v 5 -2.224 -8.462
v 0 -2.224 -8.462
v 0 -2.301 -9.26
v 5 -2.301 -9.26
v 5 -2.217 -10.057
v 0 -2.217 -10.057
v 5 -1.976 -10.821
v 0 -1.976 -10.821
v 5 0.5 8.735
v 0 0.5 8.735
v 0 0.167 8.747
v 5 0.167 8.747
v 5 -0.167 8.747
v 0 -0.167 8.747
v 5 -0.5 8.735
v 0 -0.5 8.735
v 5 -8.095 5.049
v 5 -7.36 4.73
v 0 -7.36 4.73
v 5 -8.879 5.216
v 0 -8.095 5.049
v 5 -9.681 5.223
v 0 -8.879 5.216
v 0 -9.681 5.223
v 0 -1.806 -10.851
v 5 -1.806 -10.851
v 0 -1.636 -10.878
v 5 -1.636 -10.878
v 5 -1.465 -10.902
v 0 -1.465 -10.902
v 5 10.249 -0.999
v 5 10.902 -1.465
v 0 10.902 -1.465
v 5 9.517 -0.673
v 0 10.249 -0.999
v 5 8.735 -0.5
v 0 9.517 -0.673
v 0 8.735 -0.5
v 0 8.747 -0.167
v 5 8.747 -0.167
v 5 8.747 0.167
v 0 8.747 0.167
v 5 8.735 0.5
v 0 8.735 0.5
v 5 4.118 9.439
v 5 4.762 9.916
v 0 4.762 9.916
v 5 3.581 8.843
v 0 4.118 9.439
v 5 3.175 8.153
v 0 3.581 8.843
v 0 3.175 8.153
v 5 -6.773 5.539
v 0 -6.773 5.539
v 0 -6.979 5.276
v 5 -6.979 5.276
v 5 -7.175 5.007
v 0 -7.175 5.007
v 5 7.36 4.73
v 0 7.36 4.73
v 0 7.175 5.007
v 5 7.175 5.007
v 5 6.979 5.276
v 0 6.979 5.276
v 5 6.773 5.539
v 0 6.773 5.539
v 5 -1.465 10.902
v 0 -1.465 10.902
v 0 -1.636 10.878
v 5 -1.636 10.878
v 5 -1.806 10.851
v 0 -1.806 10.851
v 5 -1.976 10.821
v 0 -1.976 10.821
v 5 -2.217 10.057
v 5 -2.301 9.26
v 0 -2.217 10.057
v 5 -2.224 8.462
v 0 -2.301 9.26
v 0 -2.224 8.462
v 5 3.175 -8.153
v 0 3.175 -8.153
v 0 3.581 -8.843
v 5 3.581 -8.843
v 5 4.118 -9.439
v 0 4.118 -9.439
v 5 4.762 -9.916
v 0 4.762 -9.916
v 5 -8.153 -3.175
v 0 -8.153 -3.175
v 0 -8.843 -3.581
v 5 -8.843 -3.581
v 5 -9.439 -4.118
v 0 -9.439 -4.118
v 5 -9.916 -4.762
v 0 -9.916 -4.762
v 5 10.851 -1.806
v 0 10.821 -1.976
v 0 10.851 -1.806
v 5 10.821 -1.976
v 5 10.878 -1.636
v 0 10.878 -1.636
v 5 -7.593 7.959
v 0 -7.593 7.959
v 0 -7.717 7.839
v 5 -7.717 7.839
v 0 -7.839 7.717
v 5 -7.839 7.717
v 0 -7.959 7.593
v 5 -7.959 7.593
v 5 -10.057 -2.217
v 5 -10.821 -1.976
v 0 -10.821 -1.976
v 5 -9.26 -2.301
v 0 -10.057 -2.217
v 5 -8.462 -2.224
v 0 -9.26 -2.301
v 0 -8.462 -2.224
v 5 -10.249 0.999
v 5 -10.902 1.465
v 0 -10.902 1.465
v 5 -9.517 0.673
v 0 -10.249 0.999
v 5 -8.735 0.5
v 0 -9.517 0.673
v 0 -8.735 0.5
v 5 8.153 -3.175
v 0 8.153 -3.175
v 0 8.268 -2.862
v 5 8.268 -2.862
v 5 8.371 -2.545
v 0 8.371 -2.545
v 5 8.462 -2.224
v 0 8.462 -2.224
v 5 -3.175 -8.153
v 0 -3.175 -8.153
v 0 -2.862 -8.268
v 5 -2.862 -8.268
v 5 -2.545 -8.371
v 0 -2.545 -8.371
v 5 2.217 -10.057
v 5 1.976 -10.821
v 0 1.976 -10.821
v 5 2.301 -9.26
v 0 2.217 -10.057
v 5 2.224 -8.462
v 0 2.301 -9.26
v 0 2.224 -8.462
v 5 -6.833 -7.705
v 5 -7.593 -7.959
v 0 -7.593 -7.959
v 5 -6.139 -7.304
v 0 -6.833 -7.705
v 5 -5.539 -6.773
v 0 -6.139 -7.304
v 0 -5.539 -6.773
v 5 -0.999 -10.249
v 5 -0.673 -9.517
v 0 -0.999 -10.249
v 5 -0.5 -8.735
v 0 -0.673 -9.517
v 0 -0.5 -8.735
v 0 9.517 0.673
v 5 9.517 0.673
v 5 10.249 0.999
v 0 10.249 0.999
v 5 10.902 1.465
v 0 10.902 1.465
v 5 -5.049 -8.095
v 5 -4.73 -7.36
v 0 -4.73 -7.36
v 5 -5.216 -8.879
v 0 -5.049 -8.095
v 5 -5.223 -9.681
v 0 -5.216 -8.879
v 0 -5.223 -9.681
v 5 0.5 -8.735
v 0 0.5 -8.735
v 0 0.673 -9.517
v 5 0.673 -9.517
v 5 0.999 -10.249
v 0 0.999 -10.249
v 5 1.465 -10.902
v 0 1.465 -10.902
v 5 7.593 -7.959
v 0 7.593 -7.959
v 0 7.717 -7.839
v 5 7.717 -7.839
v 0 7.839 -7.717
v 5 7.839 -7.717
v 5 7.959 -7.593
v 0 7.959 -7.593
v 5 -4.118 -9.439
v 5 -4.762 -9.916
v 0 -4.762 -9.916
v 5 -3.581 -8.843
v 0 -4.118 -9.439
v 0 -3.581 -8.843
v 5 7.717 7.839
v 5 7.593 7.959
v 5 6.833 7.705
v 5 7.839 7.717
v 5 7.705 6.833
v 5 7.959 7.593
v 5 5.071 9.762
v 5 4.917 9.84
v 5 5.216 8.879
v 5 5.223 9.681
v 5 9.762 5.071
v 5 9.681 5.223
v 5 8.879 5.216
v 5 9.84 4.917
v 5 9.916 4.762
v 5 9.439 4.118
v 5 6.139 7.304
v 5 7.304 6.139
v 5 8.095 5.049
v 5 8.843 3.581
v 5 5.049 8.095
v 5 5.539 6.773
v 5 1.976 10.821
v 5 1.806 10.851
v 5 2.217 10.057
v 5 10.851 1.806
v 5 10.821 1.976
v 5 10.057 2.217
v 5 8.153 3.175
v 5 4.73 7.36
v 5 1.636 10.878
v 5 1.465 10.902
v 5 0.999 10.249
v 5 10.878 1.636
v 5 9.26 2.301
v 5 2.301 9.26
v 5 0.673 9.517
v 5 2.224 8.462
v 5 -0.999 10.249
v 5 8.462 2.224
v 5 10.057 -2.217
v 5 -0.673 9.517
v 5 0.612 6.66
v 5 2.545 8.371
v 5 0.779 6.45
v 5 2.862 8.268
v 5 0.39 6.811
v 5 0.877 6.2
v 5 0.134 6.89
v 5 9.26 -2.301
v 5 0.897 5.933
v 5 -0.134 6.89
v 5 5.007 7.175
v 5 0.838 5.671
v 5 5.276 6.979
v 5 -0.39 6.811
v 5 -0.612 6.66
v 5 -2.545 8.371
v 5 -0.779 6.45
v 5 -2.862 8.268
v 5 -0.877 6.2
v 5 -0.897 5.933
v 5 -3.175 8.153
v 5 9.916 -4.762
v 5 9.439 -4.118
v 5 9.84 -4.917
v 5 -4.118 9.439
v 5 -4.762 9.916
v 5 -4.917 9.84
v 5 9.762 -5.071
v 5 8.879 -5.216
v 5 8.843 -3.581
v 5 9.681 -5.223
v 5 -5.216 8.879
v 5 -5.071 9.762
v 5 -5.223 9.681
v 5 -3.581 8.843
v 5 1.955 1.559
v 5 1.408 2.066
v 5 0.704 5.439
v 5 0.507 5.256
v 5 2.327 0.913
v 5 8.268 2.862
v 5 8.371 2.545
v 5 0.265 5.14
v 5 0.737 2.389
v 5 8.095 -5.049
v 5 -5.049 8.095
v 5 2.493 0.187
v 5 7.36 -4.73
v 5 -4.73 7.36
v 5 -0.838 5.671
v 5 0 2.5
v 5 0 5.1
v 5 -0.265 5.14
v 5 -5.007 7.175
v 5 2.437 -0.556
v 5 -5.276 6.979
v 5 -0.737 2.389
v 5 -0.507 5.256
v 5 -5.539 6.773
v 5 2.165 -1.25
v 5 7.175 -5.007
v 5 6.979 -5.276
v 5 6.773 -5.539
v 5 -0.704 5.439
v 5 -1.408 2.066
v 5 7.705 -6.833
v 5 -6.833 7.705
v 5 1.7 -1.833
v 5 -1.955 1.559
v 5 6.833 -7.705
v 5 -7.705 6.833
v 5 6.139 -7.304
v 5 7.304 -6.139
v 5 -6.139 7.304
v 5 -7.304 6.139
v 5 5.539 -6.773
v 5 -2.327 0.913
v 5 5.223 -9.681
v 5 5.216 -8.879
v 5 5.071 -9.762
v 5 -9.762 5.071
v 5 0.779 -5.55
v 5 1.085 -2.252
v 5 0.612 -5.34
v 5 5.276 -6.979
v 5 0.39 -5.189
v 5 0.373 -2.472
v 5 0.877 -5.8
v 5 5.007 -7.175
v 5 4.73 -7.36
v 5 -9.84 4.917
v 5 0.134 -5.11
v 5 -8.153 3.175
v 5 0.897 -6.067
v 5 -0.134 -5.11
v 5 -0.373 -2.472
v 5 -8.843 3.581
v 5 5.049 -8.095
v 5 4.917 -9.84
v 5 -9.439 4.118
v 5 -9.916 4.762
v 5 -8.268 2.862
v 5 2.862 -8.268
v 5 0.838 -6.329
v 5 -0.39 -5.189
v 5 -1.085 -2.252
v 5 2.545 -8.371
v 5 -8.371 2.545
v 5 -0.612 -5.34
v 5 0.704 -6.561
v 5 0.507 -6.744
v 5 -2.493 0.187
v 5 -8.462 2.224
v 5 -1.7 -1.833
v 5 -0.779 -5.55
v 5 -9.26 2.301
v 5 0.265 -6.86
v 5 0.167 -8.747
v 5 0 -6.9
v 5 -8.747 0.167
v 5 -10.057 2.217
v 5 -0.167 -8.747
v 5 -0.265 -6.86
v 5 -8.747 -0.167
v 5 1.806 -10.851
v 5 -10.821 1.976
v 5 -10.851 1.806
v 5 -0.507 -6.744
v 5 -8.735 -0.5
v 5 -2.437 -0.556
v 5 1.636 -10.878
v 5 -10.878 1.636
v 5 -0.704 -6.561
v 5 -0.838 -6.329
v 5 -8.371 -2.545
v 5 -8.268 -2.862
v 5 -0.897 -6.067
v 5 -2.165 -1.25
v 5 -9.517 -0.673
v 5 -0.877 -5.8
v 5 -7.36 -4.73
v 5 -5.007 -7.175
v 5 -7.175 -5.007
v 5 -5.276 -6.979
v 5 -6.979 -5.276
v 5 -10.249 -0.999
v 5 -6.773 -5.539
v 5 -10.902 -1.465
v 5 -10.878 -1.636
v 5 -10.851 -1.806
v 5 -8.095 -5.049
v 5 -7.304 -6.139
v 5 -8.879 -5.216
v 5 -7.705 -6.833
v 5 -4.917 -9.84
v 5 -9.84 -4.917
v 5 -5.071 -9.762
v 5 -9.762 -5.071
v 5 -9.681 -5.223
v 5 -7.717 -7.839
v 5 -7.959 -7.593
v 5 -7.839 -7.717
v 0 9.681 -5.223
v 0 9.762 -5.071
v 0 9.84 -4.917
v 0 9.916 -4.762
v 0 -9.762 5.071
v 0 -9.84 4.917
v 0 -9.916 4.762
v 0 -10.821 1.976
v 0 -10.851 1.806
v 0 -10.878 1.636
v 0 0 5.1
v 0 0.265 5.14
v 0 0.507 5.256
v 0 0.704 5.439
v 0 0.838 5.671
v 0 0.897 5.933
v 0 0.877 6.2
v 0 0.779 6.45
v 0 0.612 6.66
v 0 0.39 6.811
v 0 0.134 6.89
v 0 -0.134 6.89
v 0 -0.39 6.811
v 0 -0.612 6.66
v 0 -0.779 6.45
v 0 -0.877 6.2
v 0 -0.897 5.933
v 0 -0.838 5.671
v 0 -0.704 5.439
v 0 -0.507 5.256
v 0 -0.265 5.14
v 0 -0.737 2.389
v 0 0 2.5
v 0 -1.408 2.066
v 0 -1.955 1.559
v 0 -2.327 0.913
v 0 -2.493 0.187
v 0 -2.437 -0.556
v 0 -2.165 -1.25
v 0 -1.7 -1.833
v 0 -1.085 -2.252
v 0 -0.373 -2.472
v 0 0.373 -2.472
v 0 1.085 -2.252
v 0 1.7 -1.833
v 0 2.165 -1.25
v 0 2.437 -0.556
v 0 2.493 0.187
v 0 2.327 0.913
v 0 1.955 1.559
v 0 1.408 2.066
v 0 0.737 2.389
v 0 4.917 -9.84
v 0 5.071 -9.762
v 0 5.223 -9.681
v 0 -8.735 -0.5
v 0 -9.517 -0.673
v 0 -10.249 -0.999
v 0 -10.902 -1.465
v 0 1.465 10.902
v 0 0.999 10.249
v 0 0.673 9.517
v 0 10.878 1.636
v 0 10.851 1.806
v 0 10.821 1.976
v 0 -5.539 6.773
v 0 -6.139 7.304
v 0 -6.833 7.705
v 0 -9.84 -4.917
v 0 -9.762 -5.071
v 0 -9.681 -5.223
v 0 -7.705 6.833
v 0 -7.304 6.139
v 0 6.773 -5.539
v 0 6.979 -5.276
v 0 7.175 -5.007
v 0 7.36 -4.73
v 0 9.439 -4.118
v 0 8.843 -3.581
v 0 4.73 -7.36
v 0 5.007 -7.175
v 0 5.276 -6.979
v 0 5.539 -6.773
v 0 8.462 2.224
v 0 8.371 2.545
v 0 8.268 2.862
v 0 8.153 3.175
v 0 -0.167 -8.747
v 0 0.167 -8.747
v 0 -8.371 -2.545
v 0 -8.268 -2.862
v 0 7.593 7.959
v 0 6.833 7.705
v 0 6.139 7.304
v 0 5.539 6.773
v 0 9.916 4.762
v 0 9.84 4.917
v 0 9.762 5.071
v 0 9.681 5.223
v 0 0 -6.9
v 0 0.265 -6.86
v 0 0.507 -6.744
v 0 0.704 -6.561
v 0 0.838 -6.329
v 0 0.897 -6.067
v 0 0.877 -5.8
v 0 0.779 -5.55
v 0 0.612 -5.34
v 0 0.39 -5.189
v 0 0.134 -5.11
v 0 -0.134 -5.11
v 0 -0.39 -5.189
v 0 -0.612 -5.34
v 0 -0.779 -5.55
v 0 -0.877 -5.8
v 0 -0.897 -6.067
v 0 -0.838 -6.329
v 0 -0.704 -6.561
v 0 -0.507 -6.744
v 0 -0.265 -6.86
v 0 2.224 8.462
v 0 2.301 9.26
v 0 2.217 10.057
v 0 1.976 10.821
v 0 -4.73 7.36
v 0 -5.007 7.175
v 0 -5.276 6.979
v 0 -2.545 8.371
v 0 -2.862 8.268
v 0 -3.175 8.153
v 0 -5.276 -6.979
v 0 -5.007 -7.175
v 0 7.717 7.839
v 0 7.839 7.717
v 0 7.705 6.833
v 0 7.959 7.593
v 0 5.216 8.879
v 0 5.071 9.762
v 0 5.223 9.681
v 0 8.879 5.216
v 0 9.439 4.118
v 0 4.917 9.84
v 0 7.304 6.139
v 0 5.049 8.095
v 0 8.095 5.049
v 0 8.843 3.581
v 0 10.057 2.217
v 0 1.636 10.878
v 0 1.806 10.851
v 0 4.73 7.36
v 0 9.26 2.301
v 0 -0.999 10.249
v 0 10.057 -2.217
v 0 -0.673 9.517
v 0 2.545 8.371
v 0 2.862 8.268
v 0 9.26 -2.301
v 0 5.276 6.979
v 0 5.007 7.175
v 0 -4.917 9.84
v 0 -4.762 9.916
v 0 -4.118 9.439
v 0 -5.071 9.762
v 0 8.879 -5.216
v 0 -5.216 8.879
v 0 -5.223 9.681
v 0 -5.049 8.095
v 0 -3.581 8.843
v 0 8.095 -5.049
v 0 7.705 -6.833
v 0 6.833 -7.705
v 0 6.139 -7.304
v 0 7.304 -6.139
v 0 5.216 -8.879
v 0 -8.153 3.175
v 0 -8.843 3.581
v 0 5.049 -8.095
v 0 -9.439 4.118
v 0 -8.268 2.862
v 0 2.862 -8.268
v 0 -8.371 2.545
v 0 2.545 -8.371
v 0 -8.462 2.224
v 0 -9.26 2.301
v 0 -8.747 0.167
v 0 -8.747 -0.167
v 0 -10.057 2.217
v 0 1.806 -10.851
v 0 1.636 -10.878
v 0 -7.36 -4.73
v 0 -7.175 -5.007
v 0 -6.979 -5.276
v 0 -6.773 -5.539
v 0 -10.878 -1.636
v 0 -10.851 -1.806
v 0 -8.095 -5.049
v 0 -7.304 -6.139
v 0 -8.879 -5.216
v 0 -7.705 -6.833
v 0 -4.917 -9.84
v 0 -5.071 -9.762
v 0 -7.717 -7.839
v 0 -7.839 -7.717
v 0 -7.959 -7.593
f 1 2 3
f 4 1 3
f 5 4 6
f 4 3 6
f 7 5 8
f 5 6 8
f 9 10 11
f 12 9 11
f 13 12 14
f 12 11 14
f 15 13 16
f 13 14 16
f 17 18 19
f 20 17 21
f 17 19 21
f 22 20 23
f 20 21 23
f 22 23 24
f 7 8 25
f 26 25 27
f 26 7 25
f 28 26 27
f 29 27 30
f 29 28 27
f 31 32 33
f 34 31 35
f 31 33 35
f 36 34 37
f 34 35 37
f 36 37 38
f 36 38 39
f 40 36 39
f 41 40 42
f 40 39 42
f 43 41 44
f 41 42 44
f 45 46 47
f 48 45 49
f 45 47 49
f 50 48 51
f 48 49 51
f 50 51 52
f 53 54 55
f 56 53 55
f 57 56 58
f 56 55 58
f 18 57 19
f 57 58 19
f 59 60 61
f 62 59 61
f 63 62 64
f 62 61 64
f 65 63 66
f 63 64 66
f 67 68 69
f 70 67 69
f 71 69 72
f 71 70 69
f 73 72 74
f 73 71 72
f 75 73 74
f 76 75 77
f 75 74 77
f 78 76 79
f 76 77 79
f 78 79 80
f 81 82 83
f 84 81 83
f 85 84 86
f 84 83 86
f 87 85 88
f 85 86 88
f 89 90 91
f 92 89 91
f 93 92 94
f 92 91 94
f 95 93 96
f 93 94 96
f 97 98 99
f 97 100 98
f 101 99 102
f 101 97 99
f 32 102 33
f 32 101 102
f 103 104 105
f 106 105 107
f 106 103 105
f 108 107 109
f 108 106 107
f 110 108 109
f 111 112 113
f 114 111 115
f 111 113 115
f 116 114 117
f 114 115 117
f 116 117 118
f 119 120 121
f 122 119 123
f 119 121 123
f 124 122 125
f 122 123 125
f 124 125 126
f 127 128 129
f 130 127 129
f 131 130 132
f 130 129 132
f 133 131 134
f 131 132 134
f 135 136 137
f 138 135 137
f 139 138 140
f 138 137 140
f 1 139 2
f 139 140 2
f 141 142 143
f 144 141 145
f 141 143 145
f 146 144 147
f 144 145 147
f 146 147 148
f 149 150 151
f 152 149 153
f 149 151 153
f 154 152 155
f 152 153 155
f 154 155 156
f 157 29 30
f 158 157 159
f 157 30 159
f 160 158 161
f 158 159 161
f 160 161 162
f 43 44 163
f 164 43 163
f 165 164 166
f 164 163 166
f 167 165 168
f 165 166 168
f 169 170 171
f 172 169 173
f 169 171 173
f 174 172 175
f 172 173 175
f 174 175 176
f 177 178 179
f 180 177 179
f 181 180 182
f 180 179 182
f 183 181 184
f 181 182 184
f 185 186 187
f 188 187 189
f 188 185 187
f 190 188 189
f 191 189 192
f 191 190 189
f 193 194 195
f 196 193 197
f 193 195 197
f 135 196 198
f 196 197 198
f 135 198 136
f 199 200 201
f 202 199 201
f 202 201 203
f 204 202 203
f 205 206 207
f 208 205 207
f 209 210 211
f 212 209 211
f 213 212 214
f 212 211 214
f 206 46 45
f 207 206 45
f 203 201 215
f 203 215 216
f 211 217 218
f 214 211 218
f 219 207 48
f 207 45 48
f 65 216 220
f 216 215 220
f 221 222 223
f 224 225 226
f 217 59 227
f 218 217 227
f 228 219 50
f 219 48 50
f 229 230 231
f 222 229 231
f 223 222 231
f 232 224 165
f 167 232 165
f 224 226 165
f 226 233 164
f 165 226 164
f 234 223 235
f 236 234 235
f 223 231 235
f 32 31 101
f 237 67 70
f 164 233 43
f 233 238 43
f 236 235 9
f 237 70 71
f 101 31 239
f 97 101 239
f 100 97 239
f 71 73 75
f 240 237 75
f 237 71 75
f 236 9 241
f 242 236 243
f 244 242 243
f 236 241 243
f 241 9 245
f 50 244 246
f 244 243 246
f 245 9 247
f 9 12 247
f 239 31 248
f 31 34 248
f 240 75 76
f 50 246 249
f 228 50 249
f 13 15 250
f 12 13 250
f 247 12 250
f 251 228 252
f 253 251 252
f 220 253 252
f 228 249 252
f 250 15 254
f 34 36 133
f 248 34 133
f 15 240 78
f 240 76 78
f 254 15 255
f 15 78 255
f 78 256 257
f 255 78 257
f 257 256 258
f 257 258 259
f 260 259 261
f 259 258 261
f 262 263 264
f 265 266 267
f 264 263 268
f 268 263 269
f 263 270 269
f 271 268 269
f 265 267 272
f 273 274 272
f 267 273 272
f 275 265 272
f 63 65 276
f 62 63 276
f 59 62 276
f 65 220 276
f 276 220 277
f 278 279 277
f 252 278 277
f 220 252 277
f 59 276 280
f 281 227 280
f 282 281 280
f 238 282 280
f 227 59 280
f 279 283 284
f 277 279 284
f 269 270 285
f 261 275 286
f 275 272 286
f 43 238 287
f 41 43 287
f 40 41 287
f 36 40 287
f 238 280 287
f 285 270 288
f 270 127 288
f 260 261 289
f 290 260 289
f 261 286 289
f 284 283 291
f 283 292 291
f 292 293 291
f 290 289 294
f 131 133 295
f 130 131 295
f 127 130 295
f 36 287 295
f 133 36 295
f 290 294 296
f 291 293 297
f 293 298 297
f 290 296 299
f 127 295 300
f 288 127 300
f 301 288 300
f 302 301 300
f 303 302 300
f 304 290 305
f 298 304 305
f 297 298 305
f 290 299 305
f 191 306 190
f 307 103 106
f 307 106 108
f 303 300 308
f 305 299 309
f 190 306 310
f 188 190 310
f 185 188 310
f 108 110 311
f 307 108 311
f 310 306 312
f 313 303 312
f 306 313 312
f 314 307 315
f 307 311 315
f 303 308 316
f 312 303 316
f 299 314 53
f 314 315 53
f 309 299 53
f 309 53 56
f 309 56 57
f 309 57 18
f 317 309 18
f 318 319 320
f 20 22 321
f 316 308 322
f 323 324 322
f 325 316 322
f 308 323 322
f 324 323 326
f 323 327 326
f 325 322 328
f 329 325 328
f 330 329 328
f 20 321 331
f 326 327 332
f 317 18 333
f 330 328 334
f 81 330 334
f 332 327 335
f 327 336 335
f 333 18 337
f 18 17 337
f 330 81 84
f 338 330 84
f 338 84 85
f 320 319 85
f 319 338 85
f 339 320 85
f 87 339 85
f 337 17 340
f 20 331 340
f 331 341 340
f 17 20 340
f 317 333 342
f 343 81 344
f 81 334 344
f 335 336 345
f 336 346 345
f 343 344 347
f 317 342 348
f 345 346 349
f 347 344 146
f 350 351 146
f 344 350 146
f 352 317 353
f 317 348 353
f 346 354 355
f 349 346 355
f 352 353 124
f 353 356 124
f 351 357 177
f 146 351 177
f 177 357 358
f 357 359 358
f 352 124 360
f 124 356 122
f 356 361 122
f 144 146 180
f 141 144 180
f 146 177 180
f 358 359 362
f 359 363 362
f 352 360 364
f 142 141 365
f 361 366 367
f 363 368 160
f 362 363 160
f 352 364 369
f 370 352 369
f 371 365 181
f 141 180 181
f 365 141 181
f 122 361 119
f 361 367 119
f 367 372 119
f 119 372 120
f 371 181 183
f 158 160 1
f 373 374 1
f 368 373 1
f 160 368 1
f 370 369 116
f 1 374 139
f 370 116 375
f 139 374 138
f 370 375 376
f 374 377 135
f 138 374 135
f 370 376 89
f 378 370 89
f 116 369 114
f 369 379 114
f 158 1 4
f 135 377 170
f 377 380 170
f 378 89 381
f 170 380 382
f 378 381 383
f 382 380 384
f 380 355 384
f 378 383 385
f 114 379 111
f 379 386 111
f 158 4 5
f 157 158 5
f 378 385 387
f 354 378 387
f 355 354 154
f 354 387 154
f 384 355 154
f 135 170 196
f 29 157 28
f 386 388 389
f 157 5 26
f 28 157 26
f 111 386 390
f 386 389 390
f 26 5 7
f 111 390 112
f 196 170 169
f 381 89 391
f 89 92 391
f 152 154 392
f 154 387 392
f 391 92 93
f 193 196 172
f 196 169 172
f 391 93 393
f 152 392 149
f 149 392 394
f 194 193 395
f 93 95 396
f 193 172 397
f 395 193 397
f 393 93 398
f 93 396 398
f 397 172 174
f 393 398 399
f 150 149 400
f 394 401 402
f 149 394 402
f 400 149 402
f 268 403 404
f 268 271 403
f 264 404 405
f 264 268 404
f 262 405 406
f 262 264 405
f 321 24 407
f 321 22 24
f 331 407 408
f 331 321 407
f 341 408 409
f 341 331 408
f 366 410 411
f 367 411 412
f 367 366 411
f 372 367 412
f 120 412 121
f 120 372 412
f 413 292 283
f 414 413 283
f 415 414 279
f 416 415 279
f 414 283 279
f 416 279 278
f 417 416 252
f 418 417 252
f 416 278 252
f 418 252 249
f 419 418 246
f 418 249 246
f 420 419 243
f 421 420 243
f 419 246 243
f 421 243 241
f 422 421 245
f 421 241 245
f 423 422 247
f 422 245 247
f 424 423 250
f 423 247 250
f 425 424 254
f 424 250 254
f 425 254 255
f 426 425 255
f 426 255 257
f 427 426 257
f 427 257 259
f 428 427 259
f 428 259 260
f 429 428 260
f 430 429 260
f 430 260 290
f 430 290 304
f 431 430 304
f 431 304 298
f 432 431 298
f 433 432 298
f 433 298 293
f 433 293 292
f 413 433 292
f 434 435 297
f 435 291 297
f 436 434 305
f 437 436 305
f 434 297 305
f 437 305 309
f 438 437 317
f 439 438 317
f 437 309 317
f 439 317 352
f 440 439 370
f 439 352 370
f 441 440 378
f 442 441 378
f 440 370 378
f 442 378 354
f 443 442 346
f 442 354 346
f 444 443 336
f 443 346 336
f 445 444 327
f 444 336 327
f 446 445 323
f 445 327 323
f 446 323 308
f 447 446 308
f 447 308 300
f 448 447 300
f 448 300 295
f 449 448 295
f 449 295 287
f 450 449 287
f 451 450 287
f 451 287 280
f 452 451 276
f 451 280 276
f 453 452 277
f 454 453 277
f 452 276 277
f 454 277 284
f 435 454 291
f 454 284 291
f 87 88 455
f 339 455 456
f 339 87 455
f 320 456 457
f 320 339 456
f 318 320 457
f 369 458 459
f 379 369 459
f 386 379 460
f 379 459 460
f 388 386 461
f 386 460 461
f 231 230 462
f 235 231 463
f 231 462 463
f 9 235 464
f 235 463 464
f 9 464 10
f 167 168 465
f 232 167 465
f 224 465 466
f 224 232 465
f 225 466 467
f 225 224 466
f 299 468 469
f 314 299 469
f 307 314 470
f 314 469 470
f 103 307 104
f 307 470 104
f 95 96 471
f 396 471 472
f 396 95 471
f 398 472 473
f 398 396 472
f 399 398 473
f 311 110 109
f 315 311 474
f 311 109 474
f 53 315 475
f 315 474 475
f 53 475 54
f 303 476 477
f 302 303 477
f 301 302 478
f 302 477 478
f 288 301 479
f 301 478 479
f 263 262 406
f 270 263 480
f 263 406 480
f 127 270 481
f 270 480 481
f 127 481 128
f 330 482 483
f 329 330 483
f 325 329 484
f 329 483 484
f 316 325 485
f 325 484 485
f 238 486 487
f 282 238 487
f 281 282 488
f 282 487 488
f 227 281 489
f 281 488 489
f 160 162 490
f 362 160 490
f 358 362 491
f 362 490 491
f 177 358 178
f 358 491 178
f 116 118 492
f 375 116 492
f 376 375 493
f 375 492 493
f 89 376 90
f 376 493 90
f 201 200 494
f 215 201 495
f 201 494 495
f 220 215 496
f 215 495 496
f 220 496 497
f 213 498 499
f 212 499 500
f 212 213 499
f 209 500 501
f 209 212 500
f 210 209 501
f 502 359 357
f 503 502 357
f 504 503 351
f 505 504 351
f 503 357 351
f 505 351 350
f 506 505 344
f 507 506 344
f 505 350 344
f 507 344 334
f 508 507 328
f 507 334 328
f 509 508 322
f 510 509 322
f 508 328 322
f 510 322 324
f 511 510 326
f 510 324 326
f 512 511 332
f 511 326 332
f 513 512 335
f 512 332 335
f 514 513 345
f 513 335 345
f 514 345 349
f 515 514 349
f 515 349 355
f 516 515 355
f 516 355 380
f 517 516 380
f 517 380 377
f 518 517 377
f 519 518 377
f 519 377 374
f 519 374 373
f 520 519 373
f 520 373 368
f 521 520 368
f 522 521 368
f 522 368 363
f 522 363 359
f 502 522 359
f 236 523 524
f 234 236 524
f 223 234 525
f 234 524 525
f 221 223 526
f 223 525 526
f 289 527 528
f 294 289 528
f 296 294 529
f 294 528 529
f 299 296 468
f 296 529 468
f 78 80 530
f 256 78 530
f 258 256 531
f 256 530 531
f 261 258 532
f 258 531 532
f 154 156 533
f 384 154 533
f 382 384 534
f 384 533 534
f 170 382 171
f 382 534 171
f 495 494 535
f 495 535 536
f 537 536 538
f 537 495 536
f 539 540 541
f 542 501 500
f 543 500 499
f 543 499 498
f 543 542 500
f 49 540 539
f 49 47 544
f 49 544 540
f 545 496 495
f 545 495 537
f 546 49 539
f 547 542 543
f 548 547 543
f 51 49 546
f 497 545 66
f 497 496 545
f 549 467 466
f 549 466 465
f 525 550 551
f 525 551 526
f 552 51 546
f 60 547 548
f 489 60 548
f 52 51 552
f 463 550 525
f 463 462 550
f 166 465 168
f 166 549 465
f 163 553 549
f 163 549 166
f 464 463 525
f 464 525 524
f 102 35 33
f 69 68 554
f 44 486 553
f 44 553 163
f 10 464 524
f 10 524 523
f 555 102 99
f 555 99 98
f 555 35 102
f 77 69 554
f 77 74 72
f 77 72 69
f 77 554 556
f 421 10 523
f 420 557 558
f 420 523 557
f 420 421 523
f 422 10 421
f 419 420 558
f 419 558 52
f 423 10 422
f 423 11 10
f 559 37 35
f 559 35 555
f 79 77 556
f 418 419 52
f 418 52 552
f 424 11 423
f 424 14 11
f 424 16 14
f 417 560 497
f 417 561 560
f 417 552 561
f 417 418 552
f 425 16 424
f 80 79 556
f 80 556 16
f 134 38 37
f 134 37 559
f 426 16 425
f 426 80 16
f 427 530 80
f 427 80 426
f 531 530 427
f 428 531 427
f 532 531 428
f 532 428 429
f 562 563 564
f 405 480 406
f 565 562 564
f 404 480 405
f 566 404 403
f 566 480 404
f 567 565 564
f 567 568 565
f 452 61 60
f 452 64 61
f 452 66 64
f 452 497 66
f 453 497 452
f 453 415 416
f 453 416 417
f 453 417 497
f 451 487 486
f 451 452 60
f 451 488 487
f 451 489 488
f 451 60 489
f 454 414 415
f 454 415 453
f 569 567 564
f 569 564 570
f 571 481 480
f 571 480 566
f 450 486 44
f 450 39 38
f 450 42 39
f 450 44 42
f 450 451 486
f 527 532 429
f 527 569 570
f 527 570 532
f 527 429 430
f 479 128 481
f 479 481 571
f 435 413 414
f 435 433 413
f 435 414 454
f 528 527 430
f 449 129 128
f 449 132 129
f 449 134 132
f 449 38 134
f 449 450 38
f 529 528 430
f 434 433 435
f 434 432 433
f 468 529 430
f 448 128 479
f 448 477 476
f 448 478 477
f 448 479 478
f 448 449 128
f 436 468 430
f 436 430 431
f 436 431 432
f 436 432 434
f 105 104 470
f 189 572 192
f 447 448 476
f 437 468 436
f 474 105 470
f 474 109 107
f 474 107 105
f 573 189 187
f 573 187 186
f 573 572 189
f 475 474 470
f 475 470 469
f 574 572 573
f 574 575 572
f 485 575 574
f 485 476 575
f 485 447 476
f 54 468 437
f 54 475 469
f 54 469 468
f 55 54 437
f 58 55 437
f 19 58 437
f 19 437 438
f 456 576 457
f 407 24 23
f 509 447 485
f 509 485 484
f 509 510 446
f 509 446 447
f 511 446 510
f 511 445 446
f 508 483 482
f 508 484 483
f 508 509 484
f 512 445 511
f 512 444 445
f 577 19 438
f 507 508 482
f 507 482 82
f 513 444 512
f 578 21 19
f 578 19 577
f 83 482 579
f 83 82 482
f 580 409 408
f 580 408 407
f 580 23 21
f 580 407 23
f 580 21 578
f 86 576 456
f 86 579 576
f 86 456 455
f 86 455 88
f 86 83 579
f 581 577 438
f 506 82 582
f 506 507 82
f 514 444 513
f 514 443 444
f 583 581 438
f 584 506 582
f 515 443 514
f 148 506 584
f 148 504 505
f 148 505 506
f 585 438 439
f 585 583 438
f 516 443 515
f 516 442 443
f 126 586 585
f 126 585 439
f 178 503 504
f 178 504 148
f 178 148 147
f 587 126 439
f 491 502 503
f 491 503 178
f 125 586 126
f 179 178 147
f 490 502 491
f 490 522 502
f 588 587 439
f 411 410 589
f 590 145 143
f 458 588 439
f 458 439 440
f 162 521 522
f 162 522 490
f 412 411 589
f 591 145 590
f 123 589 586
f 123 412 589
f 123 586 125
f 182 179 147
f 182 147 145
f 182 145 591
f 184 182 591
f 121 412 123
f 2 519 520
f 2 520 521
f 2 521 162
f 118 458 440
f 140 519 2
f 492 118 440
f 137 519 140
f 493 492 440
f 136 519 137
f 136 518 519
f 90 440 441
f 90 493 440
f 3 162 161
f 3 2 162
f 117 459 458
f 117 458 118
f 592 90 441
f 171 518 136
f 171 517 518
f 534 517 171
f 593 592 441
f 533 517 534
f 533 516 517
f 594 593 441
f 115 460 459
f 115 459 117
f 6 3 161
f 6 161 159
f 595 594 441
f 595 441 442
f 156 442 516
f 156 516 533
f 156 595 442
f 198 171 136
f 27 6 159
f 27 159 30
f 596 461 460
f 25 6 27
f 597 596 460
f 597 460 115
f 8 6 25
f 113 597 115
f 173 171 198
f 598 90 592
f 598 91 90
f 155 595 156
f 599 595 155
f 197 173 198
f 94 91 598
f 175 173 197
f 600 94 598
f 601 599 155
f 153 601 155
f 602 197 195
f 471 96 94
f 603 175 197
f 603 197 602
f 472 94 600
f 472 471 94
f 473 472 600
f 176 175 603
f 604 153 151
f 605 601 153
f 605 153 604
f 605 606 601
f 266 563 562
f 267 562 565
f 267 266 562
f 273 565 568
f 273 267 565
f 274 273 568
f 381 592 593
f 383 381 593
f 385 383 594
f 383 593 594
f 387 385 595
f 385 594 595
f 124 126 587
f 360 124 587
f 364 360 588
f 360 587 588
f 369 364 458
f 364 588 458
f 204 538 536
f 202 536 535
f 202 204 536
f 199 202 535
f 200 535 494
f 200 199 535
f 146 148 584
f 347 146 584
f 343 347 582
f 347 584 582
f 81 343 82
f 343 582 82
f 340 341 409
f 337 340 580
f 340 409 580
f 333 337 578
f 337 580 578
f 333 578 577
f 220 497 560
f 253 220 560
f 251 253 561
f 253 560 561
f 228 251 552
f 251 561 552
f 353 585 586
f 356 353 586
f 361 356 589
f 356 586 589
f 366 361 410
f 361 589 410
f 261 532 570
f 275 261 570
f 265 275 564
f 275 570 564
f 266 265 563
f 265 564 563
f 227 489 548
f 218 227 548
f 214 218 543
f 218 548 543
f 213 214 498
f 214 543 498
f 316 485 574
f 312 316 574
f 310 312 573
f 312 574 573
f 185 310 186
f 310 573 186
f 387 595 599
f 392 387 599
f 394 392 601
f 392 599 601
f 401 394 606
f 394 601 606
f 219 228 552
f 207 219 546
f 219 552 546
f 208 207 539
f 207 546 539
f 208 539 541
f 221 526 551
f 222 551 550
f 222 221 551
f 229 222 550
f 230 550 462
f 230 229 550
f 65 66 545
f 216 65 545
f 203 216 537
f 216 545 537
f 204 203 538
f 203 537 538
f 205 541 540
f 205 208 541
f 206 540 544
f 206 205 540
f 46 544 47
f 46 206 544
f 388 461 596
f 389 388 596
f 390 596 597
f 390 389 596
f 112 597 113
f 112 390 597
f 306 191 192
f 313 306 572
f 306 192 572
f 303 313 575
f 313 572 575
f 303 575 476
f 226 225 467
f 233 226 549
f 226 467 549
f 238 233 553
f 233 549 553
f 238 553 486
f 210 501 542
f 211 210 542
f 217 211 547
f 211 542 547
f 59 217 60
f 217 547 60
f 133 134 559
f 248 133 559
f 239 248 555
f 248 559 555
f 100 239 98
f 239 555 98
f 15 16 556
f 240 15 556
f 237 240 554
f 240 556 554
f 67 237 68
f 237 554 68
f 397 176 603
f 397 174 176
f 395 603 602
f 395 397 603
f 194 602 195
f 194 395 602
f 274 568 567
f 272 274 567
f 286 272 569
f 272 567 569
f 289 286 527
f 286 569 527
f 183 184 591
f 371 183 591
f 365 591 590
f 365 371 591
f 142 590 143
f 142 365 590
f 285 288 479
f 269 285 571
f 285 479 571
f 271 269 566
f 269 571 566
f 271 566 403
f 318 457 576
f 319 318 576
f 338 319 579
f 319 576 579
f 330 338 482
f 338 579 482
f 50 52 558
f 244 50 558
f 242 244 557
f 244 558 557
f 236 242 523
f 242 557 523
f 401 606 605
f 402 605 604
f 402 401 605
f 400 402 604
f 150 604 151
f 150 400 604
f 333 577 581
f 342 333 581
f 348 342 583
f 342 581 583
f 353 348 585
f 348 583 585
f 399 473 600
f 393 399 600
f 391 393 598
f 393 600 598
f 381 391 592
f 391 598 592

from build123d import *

# Parameters (mm, degrees)
BASPROSKE_W        = 5
BASPROSKE_H        = 11
TOOTHCUT_DEPTH     = 17.340134638
TEETHCUTS_COUNT    = 20
TEETHCUTS_ANGLE    = 342
BORSKE_R           = 2.5
BORE_DEPTH         = 50.0000508
SKETCH1_R          = 0.9
CUT_EXTRUDE1_DEPTH = 10


with BuildPart() as part:
    # BasProSke → Base-Revolve (revolve)
    with BuildSketch(Plane(origin=(0, 0, 0), x_dir=(1, 0, 0), z_dir=(0, 1, 0)), mode=Mode.PRIVATE) as base_revolve_sk:
        with Locations((2.5, 5.5)):
            Rectangle(BASPROSKE_W, BASPROSKE_H)
    revolve(base_revolve_sk.sketch.rotate(Axis((-10, 0, 0), (1, 0, 0)), 180), axis=Axis((-10, 0, 0), (1, 0, 0)))

    # TooCutSke → ToothCut (cut, through all)
    with BuildSketch(Plane(origin=(0, 0, 0), x_dir=(0, 0, -1), z_dir=(1, 0, 0))):
        with BuildLine():
            ThreePointArc((0.499924007, 8.734705318), (0, 8.749), (-0.499924007, 8.734705318))
            ThreePointArc((-0.499924007, 8.734705318), (-0.824302243, 9.905497836), (-1.485192705, 10.924909509))
            ThreePointArc((-1.485192705, 10.924909509), (0, 11.0254), (1.485192705, 10.924909509))
            ThreePointArc((1.485192705, 10.924909509), (0.824302243, 9.905497836), (0.499924007, 8.734705318))
        make_face()
    toothcut = extrude(amount=TOOTHCUT_DEPTH, mode=Mode.SUBTRACT)

    # TeethCuts: ToothCut ×20 about axis
    teethcuts_axis = Axis((-10, 0, 0), (1, 0, 0))
    for i in range(1, TEETHCUTS_COUNT):
        add(toothcut.rotate(teethcuts_axis, i * TEETHCUTS_ANGLE / (TEETHCUTS_COUNT - 1)), mode=Mode.SUBTRACT)

    # BorSke → Bore (cut, symmetric)
    with BuildSketch(Plane(origin=(0, 0, 0), x_dir=(0, 0, -1), z_dir=(1, 0, 0))):
        with Locations(Location((0, 0, 0), (0, 0, 180))):
            Circle(BORSKE_R)
    extrude(amount=BORE_DEPTH, both=True, mode=Mode.SUBTRACT)

    # Sketch1 → Cut-Extrude1 (cut)
    with BuildSketch(Plane(origin=(5, 0, 0), x_dir=(0, 0, -1), z_dir=(1, 0, 0))):
        with Locations((6, 0)):
            Circle(SKETCH1_R)
        with Locations((-6, 0)):
            Circle(SKETCH1_R)
    extrude(amount=-CUT_EXTRUDE1_DEPTH, mode=Mode.SUBTRACT)


solid = part.part
